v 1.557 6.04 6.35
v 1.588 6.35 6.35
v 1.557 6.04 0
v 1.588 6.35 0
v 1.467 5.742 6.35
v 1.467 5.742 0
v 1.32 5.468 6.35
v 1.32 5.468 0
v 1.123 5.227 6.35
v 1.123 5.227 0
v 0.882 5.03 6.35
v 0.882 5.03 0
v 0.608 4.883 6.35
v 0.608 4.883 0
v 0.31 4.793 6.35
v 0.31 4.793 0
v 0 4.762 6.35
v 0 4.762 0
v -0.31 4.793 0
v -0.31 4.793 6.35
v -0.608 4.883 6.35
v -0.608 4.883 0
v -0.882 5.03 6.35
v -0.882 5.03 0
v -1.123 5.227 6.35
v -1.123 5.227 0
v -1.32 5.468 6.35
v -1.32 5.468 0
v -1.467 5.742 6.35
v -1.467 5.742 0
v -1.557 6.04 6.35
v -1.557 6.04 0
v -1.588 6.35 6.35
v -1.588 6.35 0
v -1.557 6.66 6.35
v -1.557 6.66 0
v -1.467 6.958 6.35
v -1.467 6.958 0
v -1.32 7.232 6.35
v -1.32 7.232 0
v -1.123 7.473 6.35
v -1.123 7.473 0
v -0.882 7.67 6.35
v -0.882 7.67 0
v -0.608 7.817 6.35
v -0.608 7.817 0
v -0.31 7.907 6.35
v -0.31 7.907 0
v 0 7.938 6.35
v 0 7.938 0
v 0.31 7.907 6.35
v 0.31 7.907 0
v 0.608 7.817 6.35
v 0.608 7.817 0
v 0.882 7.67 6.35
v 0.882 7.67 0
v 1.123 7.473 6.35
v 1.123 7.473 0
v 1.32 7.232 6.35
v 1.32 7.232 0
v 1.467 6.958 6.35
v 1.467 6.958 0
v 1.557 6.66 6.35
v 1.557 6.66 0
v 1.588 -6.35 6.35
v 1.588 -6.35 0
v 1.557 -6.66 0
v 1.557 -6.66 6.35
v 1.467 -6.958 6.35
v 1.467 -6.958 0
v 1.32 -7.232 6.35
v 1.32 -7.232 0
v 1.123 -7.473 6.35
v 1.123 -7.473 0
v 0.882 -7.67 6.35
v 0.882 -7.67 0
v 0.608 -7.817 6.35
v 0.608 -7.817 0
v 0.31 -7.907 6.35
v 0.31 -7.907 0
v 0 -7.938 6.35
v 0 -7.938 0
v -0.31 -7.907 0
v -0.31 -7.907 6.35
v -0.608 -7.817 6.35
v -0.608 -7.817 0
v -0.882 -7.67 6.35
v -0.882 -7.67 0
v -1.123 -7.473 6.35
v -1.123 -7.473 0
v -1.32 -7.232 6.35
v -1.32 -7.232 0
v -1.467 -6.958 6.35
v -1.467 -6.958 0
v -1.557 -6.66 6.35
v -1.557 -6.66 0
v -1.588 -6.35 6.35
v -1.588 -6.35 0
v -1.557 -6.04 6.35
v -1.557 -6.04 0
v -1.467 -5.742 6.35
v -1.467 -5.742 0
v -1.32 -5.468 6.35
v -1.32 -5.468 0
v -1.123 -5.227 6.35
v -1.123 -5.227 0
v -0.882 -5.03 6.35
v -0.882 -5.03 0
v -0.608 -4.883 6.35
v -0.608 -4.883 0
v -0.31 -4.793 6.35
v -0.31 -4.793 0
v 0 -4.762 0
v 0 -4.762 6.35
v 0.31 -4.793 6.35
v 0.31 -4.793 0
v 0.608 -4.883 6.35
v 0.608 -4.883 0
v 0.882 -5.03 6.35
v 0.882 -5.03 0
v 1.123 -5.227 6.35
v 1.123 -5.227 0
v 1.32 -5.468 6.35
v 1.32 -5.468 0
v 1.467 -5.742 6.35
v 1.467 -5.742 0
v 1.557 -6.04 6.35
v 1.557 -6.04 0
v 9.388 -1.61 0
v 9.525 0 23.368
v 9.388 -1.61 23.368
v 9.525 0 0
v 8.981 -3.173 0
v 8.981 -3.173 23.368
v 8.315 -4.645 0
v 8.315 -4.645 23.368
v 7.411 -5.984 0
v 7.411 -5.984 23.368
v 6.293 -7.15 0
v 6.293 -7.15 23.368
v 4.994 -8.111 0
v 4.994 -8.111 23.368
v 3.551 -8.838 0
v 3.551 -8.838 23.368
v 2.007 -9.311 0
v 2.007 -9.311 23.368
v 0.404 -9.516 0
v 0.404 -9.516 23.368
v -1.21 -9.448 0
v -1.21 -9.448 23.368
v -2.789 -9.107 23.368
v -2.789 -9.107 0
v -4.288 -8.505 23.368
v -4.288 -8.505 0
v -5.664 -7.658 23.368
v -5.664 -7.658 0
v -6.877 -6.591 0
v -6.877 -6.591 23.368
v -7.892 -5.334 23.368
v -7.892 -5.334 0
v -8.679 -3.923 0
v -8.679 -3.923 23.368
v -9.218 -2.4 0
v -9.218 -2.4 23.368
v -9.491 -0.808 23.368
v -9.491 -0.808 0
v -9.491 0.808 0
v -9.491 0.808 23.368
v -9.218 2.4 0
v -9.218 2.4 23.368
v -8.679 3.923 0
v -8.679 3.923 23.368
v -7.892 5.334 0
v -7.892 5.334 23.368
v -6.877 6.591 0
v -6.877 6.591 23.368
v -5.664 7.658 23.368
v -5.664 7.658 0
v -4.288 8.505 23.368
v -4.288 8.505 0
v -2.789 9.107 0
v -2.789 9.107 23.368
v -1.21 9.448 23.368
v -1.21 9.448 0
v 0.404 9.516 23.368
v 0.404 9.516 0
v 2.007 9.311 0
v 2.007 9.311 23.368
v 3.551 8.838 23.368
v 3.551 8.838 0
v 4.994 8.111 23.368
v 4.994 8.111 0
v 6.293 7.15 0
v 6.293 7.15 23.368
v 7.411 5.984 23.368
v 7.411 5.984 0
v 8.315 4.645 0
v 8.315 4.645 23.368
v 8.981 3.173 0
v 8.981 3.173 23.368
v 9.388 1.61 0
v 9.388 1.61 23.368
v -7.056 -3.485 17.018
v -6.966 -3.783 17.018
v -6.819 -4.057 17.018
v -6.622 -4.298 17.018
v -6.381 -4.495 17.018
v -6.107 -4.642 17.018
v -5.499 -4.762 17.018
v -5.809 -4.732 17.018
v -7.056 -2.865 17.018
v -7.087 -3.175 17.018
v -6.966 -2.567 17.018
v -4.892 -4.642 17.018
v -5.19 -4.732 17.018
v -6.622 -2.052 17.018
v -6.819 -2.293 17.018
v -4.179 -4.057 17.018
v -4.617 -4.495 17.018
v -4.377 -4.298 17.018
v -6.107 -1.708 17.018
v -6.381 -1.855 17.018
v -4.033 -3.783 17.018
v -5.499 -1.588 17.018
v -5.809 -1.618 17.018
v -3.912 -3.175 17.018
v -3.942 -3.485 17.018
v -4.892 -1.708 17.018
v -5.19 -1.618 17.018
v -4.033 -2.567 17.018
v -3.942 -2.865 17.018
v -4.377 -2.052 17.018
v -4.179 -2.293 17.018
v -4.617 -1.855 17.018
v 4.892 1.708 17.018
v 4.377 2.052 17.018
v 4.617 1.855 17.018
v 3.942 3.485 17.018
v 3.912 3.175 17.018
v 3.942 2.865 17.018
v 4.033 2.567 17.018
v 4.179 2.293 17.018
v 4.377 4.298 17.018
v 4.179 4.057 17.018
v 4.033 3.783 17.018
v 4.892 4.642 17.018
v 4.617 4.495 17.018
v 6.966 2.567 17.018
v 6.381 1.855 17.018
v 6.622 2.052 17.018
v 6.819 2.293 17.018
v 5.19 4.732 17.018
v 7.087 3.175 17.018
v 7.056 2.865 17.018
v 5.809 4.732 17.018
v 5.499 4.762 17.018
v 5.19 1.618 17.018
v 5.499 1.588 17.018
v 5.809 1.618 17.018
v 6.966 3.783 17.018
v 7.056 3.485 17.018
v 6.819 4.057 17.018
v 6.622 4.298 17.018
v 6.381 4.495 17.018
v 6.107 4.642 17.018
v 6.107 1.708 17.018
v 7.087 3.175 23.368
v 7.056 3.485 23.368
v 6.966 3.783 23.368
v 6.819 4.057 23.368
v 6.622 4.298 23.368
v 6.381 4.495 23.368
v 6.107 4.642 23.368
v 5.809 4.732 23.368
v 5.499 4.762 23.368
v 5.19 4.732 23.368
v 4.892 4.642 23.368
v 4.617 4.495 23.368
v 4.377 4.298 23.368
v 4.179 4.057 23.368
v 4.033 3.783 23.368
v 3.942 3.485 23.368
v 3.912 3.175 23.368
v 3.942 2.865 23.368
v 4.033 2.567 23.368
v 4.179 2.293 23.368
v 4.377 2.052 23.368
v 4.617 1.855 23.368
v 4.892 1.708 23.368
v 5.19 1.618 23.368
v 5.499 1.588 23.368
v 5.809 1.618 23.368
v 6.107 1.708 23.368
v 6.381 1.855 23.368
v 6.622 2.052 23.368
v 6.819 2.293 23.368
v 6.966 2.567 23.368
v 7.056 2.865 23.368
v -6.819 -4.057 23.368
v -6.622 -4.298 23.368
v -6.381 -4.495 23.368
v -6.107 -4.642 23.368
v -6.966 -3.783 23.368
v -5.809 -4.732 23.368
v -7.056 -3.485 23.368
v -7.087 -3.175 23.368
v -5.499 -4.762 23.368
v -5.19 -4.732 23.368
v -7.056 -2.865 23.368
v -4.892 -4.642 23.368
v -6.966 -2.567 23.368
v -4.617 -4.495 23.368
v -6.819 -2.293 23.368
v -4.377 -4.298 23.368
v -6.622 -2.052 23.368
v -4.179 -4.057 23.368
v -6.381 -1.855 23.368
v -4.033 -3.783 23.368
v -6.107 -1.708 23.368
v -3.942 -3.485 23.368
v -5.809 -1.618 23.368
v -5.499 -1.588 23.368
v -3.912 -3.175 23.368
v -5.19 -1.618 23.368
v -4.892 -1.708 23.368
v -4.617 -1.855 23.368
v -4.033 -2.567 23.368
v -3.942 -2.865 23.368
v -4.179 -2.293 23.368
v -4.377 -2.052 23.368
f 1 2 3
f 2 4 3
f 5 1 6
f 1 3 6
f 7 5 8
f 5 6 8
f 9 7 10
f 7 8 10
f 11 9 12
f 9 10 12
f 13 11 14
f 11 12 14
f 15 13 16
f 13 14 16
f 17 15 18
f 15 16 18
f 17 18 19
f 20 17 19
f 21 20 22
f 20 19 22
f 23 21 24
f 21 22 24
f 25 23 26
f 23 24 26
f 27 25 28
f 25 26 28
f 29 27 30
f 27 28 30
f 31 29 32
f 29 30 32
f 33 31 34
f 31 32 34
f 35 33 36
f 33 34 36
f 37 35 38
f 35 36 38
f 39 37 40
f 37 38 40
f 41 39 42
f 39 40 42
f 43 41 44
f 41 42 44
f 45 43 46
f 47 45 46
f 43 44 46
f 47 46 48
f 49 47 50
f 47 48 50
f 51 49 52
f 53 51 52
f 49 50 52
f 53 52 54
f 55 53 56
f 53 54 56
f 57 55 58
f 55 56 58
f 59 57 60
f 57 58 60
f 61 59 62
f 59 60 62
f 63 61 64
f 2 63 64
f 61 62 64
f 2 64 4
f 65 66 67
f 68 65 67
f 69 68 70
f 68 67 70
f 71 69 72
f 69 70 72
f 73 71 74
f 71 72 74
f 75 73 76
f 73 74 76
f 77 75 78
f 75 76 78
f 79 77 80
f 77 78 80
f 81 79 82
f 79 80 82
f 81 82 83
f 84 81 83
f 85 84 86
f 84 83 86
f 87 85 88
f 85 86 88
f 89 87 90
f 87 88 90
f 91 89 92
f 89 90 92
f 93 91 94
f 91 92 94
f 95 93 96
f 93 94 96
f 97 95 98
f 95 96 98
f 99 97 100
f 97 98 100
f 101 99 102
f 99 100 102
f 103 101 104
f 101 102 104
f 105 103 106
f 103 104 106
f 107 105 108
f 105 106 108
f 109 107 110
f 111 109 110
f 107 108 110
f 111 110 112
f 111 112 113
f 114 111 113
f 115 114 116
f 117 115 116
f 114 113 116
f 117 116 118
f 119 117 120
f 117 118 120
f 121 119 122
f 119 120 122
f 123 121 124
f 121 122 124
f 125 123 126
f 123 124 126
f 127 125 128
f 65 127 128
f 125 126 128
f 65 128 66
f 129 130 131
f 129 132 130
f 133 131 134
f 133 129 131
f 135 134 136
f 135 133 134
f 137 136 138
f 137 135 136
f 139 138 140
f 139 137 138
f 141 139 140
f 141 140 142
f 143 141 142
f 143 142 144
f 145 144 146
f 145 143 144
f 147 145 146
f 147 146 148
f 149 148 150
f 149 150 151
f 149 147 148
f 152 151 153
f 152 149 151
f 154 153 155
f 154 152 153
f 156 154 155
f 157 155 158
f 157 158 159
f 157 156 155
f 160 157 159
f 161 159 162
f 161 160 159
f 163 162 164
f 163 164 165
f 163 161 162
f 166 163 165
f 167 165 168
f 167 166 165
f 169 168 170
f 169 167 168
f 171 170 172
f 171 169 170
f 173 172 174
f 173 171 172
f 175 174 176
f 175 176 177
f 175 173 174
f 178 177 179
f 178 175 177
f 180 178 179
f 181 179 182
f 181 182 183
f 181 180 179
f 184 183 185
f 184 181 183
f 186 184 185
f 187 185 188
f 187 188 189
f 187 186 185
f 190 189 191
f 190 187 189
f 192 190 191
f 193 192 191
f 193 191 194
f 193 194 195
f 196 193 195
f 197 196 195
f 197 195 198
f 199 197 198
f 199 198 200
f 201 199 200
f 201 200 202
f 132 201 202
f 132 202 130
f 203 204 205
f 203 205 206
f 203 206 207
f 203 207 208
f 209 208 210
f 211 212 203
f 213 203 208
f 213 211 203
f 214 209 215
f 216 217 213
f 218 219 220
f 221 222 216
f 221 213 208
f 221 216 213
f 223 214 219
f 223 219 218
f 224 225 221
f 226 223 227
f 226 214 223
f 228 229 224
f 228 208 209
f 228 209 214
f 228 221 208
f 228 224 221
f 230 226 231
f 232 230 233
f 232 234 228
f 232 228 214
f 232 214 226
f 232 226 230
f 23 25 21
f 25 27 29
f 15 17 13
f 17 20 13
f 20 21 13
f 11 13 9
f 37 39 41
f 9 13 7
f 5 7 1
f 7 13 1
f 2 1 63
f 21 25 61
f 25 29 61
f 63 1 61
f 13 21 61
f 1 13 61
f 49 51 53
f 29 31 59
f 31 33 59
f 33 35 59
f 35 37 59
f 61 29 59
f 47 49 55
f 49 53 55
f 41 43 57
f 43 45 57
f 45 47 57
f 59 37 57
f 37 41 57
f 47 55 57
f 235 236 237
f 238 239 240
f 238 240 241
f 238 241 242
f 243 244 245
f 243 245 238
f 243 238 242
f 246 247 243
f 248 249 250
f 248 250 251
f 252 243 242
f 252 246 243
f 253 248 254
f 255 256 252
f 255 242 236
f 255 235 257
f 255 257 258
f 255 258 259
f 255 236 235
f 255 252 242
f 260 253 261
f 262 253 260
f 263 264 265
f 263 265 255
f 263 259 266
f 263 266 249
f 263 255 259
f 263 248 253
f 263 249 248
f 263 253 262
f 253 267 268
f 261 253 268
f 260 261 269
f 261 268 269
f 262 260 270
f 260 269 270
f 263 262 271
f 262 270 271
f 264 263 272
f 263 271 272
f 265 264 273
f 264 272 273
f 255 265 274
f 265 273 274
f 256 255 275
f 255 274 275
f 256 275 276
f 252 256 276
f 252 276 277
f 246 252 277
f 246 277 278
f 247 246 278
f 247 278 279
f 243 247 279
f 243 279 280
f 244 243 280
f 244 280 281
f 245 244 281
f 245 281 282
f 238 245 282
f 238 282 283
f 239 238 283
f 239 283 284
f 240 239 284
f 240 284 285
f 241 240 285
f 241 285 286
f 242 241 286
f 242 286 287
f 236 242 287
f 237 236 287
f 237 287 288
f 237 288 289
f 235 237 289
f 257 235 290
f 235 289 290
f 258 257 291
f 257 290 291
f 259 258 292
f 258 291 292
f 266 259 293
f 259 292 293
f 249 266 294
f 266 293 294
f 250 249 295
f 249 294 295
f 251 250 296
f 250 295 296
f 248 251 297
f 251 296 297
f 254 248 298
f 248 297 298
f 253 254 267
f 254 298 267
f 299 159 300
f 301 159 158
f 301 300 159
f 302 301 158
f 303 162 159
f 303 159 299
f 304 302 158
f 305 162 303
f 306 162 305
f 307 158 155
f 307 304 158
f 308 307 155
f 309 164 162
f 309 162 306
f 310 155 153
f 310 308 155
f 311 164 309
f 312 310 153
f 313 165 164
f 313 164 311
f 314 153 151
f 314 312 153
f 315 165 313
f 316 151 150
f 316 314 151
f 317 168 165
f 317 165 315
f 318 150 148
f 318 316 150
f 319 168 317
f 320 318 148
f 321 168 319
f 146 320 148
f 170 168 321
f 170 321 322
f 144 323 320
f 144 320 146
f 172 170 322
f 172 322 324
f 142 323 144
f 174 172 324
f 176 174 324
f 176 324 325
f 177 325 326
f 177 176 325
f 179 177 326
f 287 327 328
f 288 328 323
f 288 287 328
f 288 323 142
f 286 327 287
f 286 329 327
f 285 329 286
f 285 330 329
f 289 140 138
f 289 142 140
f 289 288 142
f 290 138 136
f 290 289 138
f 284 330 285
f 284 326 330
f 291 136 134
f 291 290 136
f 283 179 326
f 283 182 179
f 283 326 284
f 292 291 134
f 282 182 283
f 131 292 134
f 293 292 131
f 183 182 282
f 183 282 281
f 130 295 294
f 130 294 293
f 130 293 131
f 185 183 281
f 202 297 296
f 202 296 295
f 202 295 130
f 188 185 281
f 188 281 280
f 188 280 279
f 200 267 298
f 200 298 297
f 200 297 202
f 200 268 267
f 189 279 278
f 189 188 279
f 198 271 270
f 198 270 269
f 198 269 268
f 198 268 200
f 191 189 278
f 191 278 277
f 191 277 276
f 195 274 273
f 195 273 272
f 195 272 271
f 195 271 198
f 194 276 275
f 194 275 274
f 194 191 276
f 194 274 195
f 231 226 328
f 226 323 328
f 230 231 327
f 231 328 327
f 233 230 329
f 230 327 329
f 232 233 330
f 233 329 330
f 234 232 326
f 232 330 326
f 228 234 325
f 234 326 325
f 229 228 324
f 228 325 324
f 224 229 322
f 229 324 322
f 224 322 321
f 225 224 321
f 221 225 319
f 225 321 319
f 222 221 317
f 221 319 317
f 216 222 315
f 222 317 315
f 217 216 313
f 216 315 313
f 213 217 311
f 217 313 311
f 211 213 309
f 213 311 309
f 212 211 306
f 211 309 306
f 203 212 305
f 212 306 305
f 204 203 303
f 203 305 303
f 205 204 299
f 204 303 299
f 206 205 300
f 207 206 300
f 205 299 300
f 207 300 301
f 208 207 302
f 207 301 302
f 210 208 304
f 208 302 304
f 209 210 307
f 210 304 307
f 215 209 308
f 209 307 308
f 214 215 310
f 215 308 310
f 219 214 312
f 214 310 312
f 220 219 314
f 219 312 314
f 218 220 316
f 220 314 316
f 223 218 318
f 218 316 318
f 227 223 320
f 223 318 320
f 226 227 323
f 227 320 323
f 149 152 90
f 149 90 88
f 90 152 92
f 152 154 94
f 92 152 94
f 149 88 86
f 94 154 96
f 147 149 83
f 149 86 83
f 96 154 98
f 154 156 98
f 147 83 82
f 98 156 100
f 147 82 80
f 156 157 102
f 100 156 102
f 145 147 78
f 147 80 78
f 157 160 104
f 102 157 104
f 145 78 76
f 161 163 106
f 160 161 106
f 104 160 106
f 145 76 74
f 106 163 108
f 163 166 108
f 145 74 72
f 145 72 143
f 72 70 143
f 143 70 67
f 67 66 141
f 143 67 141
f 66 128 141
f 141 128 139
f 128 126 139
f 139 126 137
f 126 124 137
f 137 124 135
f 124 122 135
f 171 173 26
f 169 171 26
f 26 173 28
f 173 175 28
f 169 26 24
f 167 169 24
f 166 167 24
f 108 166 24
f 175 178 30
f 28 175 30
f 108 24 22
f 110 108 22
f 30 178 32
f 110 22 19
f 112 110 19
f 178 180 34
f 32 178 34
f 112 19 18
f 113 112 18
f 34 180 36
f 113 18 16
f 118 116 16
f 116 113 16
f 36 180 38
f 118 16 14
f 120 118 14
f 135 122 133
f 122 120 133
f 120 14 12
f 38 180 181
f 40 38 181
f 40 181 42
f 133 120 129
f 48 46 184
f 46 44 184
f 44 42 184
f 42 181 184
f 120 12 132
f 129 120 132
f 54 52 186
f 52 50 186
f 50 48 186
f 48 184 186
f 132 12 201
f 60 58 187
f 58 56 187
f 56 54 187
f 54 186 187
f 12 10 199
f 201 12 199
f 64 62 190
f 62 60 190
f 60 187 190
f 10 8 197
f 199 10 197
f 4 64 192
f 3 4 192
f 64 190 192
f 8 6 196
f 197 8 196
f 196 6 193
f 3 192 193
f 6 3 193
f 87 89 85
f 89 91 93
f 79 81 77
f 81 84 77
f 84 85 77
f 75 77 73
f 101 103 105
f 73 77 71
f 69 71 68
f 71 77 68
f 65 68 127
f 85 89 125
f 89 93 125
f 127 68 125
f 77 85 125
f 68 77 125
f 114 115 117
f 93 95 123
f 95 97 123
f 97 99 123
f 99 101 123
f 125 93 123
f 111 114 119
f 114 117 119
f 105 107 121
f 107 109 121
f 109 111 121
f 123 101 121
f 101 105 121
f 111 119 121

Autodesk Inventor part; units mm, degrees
ref_plane "YZ Plane" through (0, 0, 0) normal (1, 0, 0) x (0, 1, 0)
ref_plane "XZ Plane" through (0, 0, 0) normal (0, 1, 0) x (-1, 0, 0)
ref_plane "XY Plane" through (0, 0, 0) normal (0, 0, 1) x (1, 0, 0)
sketch "Sketch1" plane through (0, 0, 0) normal (0, 0, 1) x (1, 0, 0)
  circle A0 centre (0, 0) radius 9.525
  circle A1 centre (0, -6.35) radius 1.5875
  circle A2 centre (0, 6.35) radius 1.5875
  line L0 (0, 9.525) -> (0, -9.525)
  dimension "d3" = 3.175
  dimension "d4" = 3.175
extrude "Extrusion2" add sketch "Sketch1" along normal blind 23.368
extrude "Extrusion3" cut sketch "Sketch1" along normal blind 6.35 contours L0 A2 | A2 L0 | L0 A1 | A1 L0
sketch "Sketch2" plane through (0, 0, 23.368) normal (0, 0, 1) x (1, 0, 0)
  circle A0 centre (0, 0) radius 9.525 projected
  line L0 (0, 9.525) -> (0, -9.525)
  line L1 (0, 0) -> (25.4, 0) construction
  line L2 (0, 0) -> (25.4, 0) construction
  line L3 (8.2489, 4.7625) -> (-8.2489, -4.7625)
  line L4 (0, 0) -> (5.4993, 3.175)
  line L5 (5.4993, 3.175) -> (-5.4993, -3.175)
  circle A1 centre (-5.4993, -3.175) radius 1.5875
  circle A2 centre (5.4993, 3.175) radius 1.5875
  line L6 (0, 0) -> (15.1329, 0) construction
  line L7 (8.2489, 4.7625) -> (-8.2489, -4.7625)
  dimension "d22" = 6.35
  dimension "d23" = 12.7
  dimension "d24" = 3.175
  dimension "d25" = 3.175
extrude "Extrusion4" cut sketch "Sketch2" against normal blind 6.35 contours A2 L3 | L3 A2 | A1 L3 | L3 A1
properties part number "Crankshaft"
